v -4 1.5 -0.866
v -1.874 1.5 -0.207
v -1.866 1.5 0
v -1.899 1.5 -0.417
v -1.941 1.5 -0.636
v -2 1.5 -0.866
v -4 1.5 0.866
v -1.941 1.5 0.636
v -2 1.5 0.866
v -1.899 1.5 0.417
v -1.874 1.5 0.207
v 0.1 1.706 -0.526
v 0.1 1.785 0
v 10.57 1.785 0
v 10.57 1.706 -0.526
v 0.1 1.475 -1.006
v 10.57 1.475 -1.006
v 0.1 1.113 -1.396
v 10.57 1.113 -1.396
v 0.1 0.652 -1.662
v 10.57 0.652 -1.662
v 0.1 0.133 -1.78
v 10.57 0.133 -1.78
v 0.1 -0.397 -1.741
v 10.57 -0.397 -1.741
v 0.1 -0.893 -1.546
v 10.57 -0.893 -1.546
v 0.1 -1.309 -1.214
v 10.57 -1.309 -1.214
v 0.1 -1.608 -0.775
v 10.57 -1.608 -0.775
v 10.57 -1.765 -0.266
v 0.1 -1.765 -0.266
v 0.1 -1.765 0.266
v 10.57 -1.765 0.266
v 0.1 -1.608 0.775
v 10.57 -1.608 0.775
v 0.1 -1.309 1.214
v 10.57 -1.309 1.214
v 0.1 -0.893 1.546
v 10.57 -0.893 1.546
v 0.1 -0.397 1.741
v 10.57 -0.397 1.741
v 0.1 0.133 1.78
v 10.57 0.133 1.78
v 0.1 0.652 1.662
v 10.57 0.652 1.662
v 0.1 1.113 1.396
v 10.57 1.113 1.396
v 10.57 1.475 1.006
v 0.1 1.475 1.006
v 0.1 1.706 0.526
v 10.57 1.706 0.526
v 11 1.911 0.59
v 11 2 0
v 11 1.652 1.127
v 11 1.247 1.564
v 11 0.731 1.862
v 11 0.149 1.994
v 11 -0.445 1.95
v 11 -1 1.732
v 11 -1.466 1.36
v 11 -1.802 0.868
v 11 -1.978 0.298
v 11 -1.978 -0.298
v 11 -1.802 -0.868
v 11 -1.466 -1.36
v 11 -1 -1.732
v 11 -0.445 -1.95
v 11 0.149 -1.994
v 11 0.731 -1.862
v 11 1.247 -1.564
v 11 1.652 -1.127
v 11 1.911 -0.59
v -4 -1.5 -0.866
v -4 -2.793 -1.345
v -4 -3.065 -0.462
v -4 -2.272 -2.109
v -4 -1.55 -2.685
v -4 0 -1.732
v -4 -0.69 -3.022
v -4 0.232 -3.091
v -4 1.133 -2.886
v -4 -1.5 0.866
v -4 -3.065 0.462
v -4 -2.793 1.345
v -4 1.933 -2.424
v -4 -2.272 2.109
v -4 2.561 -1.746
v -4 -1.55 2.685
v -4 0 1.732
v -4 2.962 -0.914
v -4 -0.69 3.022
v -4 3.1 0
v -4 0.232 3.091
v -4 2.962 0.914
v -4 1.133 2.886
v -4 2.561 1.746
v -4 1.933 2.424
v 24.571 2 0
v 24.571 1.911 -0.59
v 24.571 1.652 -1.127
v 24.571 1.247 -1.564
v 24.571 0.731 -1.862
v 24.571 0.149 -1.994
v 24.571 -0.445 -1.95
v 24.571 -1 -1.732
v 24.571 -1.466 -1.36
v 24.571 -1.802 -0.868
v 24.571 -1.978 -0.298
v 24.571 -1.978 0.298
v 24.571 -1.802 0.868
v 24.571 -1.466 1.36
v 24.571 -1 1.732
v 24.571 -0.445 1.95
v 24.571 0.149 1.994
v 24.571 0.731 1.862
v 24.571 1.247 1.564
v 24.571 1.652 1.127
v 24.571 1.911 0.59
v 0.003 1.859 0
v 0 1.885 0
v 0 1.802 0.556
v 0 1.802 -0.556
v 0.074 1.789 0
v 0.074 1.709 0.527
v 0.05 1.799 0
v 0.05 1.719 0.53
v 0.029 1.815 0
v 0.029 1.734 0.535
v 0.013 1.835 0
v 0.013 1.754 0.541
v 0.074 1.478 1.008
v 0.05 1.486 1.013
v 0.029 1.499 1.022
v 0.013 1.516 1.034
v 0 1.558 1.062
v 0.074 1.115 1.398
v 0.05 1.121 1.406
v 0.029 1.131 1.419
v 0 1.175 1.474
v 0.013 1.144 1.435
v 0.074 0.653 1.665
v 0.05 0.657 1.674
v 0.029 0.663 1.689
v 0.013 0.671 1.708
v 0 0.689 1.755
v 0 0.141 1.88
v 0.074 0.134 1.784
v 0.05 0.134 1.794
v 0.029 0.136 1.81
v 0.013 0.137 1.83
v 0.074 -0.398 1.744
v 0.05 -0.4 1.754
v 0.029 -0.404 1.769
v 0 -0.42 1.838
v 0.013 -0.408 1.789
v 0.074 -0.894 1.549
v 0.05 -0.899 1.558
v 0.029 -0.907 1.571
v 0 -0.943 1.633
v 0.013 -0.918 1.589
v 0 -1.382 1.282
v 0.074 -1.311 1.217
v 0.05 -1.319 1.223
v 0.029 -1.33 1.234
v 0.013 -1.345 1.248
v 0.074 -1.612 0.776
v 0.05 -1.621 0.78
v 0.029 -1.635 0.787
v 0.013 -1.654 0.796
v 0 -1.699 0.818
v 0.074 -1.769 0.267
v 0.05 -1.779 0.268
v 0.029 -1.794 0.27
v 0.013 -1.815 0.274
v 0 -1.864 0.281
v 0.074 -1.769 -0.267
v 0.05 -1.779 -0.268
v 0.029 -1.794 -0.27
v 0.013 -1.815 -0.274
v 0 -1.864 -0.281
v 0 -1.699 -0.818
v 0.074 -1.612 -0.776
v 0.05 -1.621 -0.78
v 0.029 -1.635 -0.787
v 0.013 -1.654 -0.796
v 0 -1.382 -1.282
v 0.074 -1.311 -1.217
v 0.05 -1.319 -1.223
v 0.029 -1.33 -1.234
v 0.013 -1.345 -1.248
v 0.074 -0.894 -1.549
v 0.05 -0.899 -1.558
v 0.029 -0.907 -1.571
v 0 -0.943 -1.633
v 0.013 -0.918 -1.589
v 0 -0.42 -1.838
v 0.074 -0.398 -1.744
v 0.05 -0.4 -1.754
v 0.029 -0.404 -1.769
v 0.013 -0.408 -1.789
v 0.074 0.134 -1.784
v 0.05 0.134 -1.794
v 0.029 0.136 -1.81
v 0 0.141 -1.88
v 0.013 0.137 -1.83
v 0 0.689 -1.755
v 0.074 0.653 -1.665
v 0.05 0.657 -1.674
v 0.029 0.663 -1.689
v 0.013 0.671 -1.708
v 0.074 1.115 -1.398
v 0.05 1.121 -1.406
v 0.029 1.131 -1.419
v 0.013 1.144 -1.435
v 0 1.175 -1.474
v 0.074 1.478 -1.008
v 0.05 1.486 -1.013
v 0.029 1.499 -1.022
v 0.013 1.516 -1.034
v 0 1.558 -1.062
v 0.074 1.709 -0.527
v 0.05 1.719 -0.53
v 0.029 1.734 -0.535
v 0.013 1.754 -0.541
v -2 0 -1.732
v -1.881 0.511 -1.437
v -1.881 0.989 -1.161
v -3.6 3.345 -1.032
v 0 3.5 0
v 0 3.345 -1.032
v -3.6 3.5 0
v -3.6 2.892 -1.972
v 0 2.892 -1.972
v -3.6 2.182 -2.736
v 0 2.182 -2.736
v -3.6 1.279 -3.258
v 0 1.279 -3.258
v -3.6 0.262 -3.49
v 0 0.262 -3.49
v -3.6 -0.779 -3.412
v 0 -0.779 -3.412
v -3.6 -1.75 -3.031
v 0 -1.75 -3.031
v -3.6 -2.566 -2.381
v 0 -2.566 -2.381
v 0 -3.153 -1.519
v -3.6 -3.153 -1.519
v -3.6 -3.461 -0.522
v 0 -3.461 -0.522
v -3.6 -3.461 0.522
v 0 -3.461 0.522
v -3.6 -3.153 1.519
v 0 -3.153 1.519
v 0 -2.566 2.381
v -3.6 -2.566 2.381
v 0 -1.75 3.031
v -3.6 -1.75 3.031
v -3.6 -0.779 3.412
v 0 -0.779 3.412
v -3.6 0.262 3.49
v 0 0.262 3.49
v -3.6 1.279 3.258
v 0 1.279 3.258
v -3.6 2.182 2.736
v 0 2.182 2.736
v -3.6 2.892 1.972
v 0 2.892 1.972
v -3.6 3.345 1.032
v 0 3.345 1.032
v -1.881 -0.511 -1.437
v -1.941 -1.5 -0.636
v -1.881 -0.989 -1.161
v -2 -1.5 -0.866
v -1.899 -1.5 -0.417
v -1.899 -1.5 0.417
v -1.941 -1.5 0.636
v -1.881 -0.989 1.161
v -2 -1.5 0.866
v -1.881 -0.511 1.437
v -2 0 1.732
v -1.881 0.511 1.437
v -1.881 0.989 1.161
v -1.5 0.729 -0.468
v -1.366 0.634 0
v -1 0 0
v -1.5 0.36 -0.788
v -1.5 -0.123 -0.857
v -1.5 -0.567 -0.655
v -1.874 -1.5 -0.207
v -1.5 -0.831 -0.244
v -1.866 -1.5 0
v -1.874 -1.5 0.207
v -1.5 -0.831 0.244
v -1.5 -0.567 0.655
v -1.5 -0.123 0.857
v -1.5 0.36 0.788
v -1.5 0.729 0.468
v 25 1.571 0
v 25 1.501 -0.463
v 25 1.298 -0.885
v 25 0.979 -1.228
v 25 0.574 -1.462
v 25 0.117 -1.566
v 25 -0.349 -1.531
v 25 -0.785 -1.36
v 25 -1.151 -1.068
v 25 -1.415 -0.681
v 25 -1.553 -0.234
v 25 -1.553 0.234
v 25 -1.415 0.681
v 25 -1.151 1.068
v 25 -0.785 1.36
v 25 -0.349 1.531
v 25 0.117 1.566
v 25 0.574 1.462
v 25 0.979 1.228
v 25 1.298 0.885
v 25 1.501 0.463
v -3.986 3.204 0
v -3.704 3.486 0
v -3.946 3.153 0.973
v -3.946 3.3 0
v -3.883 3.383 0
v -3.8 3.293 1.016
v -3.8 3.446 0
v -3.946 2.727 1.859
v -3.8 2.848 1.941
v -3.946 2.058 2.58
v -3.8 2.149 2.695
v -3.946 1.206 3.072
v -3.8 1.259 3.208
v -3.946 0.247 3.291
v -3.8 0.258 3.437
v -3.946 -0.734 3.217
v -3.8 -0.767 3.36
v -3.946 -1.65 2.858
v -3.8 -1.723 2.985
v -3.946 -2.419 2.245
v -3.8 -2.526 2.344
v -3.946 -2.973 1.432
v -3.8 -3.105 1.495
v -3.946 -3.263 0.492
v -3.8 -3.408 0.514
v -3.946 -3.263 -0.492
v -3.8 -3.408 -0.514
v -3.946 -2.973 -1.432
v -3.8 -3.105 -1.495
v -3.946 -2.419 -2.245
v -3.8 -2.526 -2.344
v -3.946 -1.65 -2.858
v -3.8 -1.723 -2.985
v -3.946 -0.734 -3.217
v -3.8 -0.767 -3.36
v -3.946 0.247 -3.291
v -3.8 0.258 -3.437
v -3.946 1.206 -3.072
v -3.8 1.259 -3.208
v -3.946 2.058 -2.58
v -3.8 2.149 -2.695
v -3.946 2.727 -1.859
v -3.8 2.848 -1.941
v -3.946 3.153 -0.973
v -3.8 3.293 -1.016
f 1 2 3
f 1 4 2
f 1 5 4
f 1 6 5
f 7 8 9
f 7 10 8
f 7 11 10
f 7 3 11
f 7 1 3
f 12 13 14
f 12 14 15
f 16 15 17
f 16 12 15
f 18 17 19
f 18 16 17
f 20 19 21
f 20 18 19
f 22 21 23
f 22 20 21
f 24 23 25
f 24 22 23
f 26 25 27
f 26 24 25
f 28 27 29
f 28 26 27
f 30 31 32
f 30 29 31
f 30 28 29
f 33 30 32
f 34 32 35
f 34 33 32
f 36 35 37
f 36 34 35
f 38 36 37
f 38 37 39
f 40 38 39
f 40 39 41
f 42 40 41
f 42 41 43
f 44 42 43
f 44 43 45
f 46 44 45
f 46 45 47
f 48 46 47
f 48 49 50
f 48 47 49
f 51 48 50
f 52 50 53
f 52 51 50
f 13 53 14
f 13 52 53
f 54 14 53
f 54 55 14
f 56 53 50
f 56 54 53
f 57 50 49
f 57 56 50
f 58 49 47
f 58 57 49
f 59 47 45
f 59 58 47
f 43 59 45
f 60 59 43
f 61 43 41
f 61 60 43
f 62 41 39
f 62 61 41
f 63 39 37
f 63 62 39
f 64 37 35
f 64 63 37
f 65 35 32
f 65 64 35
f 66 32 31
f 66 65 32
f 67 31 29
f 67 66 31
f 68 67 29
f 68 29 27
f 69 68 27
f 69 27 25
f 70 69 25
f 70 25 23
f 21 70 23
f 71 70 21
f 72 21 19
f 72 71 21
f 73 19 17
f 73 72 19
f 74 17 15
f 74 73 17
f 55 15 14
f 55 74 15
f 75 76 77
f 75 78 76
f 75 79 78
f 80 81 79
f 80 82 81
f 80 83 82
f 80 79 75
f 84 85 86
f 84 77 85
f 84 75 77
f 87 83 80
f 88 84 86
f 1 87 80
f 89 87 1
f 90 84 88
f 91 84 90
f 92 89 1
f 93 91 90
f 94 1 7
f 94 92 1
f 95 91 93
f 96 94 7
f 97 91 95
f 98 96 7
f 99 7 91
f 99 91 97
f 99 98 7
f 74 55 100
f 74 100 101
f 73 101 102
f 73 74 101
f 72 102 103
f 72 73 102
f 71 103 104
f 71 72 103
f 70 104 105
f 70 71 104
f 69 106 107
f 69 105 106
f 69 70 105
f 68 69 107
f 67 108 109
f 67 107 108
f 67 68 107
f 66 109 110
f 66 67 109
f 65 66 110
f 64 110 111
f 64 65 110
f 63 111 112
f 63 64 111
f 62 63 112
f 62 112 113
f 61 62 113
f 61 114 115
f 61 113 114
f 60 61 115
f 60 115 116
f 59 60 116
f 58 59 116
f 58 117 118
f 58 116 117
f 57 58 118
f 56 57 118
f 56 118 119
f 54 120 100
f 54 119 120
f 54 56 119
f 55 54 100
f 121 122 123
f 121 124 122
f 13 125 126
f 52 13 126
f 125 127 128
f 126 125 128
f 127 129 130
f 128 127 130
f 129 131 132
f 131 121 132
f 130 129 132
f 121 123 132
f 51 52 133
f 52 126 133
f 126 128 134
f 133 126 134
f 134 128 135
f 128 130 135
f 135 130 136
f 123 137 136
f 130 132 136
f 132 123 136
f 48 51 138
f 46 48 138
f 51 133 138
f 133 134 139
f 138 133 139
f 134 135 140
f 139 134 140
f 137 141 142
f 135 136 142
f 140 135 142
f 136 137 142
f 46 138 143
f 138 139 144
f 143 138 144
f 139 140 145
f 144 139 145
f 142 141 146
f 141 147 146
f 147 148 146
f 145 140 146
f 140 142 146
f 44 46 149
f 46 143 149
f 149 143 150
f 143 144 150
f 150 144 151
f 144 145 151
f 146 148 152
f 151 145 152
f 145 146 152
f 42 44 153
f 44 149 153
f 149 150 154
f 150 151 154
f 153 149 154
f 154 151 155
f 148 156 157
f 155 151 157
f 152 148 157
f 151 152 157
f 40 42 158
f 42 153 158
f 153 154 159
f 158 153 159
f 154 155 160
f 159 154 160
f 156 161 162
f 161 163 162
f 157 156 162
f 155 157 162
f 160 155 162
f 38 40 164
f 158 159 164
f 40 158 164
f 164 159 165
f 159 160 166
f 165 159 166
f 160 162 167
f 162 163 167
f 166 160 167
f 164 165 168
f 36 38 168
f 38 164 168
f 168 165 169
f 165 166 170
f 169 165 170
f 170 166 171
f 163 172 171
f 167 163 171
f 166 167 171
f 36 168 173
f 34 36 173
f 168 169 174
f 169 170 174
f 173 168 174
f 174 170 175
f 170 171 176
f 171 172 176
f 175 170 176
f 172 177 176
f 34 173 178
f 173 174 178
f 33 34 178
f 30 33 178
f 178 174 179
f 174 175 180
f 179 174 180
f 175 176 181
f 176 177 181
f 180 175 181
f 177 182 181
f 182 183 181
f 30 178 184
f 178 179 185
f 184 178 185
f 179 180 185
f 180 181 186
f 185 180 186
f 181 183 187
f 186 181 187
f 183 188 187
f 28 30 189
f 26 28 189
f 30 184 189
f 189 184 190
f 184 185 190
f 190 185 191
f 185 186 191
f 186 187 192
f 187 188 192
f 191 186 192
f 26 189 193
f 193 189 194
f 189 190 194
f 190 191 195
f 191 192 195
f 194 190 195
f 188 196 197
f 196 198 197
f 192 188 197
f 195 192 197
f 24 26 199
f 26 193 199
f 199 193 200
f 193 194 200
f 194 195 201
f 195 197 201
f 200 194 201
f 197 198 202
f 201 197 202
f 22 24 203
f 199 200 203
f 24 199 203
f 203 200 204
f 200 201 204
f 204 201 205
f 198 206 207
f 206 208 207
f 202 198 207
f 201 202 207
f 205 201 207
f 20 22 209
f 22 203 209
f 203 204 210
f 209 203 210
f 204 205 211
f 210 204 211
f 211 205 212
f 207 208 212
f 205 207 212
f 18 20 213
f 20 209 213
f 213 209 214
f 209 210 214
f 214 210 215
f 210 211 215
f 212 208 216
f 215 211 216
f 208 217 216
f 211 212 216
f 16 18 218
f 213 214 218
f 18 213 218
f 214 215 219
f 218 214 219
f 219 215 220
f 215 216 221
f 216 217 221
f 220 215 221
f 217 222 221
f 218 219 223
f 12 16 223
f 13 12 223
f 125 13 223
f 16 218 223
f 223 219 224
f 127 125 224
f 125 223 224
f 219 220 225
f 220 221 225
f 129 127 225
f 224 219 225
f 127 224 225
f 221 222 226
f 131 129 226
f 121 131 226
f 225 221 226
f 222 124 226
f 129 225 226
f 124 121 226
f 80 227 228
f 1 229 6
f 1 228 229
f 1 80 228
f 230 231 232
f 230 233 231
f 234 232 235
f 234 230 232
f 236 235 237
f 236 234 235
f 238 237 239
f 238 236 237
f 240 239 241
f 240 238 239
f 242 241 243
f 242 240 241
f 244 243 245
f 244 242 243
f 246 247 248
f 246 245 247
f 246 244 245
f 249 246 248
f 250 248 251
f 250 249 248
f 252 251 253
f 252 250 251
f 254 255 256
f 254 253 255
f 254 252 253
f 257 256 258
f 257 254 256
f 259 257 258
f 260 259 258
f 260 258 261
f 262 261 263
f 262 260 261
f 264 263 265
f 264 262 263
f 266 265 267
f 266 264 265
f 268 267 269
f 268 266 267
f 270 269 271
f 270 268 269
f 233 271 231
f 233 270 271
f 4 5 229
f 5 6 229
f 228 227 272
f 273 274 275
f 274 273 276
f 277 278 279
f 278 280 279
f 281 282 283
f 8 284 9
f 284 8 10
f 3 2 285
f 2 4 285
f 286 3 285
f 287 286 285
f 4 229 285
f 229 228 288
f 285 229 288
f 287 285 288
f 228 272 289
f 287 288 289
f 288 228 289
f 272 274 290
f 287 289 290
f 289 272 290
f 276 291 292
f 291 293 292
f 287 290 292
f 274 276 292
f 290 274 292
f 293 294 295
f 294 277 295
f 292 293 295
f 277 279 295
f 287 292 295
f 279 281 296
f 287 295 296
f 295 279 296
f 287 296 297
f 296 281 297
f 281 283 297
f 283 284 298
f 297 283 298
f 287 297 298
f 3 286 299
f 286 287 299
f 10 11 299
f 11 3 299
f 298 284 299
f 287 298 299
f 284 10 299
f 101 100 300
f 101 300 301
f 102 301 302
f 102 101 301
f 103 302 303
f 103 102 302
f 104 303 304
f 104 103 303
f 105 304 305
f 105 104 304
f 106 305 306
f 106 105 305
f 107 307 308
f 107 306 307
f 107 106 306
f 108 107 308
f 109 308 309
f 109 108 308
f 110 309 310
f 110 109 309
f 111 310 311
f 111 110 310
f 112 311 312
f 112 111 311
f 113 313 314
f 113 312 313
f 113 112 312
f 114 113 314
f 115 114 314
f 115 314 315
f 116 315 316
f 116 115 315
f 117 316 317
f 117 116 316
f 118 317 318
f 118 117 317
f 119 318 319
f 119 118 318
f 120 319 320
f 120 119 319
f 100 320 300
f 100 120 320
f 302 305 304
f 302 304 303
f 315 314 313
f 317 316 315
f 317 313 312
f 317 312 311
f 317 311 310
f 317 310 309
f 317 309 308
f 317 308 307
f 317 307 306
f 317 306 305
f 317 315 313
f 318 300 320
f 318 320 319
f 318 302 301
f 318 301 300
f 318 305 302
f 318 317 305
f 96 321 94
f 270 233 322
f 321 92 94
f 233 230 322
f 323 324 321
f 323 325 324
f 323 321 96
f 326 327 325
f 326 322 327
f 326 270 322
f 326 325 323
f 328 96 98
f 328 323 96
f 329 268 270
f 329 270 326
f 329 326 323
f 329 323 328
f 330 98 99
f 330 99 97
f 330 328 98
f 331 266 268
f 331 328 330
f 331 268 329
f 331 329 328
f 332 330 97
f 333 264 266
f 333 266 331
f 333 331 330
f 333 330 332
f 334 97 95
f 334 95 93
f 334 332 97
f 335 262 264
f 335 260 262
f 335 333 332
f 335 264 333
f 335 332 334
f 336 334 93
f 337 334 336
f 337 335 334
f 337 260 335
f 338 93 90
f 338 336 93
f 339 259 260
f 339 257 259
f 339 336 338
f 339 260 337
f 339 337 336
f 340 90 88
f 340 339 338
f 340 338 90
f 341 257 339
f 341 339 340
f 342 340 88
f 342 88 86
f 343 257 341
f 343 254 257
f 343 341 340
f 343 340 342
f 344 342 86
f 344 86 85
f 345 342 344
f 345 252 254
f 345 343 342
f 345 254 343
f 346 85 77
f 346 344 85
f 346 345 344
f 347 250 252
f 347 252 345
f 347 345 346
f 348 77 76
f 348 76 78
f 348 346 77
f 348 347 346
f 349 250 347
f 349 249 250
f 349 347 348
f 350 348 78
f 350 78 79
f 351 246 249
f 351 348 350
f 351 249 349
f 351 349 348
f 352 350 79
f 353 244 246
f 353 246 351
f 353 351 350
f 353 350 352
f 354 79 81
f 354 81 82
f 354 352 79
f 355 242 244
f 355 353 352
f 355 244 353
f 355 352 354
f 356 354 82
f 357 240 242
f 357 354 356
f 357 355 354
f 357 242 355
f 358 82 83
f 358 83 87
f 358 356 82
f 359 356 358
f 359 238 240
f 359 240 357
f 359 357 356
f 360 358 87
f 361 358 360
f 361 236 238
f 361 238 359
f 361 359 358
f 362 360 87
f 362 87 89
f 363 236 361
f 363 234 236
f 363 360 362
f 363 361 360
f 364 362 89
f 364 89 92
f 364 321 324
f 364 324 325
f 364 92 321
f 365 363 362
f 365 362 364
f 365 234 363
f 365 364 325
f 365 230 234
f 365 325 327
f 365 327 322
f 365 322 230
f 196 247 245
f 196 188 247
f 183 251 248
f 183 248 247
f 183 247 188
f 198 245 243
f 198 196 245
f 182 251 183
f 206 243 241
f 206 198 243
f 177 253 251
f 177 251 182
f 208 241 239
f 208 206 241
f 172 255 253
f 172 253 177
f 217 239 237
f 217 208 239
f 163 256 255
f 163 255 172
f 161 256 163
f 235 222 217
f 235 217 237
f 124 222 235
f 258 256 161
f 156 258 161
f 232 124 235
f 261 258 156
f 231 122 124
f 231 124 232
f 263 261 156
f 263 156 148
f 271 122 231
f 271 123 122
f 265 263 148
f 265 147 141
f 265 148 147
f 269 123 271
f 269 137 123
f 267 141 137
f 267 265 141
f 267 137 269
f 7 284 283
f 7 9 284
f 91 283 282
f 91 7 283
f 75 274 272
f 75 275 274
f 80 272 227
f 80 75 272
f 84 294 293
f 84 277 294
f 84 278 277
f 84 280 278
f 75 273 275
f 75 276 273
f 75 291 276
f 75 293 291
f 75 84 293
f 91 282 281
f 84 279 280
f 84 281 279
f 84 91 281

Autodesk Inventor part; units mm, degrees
ref_plane "YZ Plane" through (0, 0, 0) normal (1, 0, 0) x (0, 1, 0)
ref_plane "XZ Plane" through (0, 0, 0) normal (0, 1, 0) x (-1, 0, 0)
sketch "Эскиз1" plane through (0, 0, 0) normal (0, 0, 1) x (1, 0, 0)
  line L0 (-1, 0) -> (25, 0)
  line L1 (25, 0) -> (25, 2)
  line L2 (25, 2) -> (11, 2)
  line L3 (11, 2) -> (10.5705, 1.7853)
  line L4 (10.5705, 1.7853) -> (0, 1.7853)
  line L5 (0, 1.7853) -> (0, 3.5)
  line L6 (0, 3.5) -> (-4, 3.5)
  line L7 (-4, 3.5) -> (-4, 1.7321)
  line L8 (-4, 1.7321) -> (-2, 1.7321)
  line L9 (-2, 1.7321) -> (-1, 0)
  line L10 (-9.8, 0) -> (30.8, 0) projected
  line L11 (0, -0.7) -> (0, 4.2) projected
  line L12 (11, 2) -> (0, 2) construction
  dimension "d1" = 14
  dimension "d2" = 0.4295
  dimension "d3" = 4
  dimension "d4" = 2
  dimension "d5" = 60
  dimension "d6" = 4
  dimension "d7" = 3.5705
  dimension "d8" = 3.4641
  dimension "d9" = 7
  dimension "d26" = 25
revolve "Базовый элемент" add sketch "Эскиз1" angle 360 about axis through (-1, 0, 0) along (1, 0, 0)
sketch "Эскиз2" plane through (-4, 0, 0) normal (-1, 0, 0) x (0, 0, 1)
  circle A0 centre (0, 0) radius 1.7321 projected
  line L0 (0, -4.9) -> (0, 4.9) projected
  line L1 (-4.9, 0) -> (4.9, 0) projected
  line L2 (1.7321, 0) -> (0.866, -1.5)
  line L3 (0.866, -1.5) -> (-0.866, -1.5)
  line L4 (-0.866, -1.5) -> (-1.7321, 0)
  line L5 (-1.7321, 0) -> (-0.866, 1.5)
  line L6 (-0.866, 1.5) -> (0.866, 1.5)
  line L7 (0.866, 1.5) -> (1.7321, 0)
extrude "Паз" add sketch "Эскиз2" against normal up to next contours L7 A0 | A0 L2 | L6 L0 A0 | A0 L0 L3 | L0 L6 A0 | A0 L3 L0 | L4 A0 | A0 L5
fillet "Сопряжение1" radius 0.4 1 edges at (-4, -3.5, 0)
thread "Резьба" size "M4x0.7" class "6g" standard "ISO Metric profile" length 14
chamfer "Фаска1" distance 0.4294 distance2 0.4294 1 edges at (25, -2, 0) measured on face at (25, 0.6473, 0.1595)
ref_plane "Work Plane1" through (29, 0, 0) normal (0, -1, 0) x (1, 0, 0)
fillet "Fillet2" radius 0.1 1 edges at (0, -1.7853, 0)
equation "\"d1\" = GEL"
equation "\"d3\" = KOH"
equation "\"d4\" = INTI"
equation "\"d6\" = GD"
equation "\"d7\" = BDM"
equation "\"d8\" = 1.1547 * SW"
equation "\"d9\" = KOD"
equation "\"d26\" = NLG"
equation "\"d30\" = R"
equation "\"d17\" = RR"
equation "\"d13\" = GEL"
equation "\"d15\" = -0.5 * SPD + 0.5 * GD"
equation "\"d16\" = GUL"
equation "\"GD\" = NND"
equation "\"NLG\" = 25"
equation "\"GEL\" = 14"
equation "\"KOD\" = 7"
equation "\"KOH\" = NND"
equation "\"INTI\" = 2"
equation "\"GAL\" = 0.61345 * PTC"
equation "\"GUL\" = 0.61345 * PTC"
equation "\"BDM\" = 3.5705"
equation "\"SW\" = 3"
equation "\"RR\" = 0.4"
equation "\"SPD\" = NND - 1.2269 * PTC"
equation "\"R\" = 0.1"
equation "\"PHH\" = 0.4"
equation "\"GD1\" = THREADDIA - 1.2269 * PTC"
equation "\"THREADDIA\" = 4"
equation "\"FAWI\" = 45deg"
equation "\"PTC\" = 0.7"
equation "\"NND\" = 4"
equation "\"TOA\" = 30deg"
equation "\"E0\" = 1.155 * SW"
properties part number "CSN 02 1143 - M4 x 25" material "Сталь, мягкая"
